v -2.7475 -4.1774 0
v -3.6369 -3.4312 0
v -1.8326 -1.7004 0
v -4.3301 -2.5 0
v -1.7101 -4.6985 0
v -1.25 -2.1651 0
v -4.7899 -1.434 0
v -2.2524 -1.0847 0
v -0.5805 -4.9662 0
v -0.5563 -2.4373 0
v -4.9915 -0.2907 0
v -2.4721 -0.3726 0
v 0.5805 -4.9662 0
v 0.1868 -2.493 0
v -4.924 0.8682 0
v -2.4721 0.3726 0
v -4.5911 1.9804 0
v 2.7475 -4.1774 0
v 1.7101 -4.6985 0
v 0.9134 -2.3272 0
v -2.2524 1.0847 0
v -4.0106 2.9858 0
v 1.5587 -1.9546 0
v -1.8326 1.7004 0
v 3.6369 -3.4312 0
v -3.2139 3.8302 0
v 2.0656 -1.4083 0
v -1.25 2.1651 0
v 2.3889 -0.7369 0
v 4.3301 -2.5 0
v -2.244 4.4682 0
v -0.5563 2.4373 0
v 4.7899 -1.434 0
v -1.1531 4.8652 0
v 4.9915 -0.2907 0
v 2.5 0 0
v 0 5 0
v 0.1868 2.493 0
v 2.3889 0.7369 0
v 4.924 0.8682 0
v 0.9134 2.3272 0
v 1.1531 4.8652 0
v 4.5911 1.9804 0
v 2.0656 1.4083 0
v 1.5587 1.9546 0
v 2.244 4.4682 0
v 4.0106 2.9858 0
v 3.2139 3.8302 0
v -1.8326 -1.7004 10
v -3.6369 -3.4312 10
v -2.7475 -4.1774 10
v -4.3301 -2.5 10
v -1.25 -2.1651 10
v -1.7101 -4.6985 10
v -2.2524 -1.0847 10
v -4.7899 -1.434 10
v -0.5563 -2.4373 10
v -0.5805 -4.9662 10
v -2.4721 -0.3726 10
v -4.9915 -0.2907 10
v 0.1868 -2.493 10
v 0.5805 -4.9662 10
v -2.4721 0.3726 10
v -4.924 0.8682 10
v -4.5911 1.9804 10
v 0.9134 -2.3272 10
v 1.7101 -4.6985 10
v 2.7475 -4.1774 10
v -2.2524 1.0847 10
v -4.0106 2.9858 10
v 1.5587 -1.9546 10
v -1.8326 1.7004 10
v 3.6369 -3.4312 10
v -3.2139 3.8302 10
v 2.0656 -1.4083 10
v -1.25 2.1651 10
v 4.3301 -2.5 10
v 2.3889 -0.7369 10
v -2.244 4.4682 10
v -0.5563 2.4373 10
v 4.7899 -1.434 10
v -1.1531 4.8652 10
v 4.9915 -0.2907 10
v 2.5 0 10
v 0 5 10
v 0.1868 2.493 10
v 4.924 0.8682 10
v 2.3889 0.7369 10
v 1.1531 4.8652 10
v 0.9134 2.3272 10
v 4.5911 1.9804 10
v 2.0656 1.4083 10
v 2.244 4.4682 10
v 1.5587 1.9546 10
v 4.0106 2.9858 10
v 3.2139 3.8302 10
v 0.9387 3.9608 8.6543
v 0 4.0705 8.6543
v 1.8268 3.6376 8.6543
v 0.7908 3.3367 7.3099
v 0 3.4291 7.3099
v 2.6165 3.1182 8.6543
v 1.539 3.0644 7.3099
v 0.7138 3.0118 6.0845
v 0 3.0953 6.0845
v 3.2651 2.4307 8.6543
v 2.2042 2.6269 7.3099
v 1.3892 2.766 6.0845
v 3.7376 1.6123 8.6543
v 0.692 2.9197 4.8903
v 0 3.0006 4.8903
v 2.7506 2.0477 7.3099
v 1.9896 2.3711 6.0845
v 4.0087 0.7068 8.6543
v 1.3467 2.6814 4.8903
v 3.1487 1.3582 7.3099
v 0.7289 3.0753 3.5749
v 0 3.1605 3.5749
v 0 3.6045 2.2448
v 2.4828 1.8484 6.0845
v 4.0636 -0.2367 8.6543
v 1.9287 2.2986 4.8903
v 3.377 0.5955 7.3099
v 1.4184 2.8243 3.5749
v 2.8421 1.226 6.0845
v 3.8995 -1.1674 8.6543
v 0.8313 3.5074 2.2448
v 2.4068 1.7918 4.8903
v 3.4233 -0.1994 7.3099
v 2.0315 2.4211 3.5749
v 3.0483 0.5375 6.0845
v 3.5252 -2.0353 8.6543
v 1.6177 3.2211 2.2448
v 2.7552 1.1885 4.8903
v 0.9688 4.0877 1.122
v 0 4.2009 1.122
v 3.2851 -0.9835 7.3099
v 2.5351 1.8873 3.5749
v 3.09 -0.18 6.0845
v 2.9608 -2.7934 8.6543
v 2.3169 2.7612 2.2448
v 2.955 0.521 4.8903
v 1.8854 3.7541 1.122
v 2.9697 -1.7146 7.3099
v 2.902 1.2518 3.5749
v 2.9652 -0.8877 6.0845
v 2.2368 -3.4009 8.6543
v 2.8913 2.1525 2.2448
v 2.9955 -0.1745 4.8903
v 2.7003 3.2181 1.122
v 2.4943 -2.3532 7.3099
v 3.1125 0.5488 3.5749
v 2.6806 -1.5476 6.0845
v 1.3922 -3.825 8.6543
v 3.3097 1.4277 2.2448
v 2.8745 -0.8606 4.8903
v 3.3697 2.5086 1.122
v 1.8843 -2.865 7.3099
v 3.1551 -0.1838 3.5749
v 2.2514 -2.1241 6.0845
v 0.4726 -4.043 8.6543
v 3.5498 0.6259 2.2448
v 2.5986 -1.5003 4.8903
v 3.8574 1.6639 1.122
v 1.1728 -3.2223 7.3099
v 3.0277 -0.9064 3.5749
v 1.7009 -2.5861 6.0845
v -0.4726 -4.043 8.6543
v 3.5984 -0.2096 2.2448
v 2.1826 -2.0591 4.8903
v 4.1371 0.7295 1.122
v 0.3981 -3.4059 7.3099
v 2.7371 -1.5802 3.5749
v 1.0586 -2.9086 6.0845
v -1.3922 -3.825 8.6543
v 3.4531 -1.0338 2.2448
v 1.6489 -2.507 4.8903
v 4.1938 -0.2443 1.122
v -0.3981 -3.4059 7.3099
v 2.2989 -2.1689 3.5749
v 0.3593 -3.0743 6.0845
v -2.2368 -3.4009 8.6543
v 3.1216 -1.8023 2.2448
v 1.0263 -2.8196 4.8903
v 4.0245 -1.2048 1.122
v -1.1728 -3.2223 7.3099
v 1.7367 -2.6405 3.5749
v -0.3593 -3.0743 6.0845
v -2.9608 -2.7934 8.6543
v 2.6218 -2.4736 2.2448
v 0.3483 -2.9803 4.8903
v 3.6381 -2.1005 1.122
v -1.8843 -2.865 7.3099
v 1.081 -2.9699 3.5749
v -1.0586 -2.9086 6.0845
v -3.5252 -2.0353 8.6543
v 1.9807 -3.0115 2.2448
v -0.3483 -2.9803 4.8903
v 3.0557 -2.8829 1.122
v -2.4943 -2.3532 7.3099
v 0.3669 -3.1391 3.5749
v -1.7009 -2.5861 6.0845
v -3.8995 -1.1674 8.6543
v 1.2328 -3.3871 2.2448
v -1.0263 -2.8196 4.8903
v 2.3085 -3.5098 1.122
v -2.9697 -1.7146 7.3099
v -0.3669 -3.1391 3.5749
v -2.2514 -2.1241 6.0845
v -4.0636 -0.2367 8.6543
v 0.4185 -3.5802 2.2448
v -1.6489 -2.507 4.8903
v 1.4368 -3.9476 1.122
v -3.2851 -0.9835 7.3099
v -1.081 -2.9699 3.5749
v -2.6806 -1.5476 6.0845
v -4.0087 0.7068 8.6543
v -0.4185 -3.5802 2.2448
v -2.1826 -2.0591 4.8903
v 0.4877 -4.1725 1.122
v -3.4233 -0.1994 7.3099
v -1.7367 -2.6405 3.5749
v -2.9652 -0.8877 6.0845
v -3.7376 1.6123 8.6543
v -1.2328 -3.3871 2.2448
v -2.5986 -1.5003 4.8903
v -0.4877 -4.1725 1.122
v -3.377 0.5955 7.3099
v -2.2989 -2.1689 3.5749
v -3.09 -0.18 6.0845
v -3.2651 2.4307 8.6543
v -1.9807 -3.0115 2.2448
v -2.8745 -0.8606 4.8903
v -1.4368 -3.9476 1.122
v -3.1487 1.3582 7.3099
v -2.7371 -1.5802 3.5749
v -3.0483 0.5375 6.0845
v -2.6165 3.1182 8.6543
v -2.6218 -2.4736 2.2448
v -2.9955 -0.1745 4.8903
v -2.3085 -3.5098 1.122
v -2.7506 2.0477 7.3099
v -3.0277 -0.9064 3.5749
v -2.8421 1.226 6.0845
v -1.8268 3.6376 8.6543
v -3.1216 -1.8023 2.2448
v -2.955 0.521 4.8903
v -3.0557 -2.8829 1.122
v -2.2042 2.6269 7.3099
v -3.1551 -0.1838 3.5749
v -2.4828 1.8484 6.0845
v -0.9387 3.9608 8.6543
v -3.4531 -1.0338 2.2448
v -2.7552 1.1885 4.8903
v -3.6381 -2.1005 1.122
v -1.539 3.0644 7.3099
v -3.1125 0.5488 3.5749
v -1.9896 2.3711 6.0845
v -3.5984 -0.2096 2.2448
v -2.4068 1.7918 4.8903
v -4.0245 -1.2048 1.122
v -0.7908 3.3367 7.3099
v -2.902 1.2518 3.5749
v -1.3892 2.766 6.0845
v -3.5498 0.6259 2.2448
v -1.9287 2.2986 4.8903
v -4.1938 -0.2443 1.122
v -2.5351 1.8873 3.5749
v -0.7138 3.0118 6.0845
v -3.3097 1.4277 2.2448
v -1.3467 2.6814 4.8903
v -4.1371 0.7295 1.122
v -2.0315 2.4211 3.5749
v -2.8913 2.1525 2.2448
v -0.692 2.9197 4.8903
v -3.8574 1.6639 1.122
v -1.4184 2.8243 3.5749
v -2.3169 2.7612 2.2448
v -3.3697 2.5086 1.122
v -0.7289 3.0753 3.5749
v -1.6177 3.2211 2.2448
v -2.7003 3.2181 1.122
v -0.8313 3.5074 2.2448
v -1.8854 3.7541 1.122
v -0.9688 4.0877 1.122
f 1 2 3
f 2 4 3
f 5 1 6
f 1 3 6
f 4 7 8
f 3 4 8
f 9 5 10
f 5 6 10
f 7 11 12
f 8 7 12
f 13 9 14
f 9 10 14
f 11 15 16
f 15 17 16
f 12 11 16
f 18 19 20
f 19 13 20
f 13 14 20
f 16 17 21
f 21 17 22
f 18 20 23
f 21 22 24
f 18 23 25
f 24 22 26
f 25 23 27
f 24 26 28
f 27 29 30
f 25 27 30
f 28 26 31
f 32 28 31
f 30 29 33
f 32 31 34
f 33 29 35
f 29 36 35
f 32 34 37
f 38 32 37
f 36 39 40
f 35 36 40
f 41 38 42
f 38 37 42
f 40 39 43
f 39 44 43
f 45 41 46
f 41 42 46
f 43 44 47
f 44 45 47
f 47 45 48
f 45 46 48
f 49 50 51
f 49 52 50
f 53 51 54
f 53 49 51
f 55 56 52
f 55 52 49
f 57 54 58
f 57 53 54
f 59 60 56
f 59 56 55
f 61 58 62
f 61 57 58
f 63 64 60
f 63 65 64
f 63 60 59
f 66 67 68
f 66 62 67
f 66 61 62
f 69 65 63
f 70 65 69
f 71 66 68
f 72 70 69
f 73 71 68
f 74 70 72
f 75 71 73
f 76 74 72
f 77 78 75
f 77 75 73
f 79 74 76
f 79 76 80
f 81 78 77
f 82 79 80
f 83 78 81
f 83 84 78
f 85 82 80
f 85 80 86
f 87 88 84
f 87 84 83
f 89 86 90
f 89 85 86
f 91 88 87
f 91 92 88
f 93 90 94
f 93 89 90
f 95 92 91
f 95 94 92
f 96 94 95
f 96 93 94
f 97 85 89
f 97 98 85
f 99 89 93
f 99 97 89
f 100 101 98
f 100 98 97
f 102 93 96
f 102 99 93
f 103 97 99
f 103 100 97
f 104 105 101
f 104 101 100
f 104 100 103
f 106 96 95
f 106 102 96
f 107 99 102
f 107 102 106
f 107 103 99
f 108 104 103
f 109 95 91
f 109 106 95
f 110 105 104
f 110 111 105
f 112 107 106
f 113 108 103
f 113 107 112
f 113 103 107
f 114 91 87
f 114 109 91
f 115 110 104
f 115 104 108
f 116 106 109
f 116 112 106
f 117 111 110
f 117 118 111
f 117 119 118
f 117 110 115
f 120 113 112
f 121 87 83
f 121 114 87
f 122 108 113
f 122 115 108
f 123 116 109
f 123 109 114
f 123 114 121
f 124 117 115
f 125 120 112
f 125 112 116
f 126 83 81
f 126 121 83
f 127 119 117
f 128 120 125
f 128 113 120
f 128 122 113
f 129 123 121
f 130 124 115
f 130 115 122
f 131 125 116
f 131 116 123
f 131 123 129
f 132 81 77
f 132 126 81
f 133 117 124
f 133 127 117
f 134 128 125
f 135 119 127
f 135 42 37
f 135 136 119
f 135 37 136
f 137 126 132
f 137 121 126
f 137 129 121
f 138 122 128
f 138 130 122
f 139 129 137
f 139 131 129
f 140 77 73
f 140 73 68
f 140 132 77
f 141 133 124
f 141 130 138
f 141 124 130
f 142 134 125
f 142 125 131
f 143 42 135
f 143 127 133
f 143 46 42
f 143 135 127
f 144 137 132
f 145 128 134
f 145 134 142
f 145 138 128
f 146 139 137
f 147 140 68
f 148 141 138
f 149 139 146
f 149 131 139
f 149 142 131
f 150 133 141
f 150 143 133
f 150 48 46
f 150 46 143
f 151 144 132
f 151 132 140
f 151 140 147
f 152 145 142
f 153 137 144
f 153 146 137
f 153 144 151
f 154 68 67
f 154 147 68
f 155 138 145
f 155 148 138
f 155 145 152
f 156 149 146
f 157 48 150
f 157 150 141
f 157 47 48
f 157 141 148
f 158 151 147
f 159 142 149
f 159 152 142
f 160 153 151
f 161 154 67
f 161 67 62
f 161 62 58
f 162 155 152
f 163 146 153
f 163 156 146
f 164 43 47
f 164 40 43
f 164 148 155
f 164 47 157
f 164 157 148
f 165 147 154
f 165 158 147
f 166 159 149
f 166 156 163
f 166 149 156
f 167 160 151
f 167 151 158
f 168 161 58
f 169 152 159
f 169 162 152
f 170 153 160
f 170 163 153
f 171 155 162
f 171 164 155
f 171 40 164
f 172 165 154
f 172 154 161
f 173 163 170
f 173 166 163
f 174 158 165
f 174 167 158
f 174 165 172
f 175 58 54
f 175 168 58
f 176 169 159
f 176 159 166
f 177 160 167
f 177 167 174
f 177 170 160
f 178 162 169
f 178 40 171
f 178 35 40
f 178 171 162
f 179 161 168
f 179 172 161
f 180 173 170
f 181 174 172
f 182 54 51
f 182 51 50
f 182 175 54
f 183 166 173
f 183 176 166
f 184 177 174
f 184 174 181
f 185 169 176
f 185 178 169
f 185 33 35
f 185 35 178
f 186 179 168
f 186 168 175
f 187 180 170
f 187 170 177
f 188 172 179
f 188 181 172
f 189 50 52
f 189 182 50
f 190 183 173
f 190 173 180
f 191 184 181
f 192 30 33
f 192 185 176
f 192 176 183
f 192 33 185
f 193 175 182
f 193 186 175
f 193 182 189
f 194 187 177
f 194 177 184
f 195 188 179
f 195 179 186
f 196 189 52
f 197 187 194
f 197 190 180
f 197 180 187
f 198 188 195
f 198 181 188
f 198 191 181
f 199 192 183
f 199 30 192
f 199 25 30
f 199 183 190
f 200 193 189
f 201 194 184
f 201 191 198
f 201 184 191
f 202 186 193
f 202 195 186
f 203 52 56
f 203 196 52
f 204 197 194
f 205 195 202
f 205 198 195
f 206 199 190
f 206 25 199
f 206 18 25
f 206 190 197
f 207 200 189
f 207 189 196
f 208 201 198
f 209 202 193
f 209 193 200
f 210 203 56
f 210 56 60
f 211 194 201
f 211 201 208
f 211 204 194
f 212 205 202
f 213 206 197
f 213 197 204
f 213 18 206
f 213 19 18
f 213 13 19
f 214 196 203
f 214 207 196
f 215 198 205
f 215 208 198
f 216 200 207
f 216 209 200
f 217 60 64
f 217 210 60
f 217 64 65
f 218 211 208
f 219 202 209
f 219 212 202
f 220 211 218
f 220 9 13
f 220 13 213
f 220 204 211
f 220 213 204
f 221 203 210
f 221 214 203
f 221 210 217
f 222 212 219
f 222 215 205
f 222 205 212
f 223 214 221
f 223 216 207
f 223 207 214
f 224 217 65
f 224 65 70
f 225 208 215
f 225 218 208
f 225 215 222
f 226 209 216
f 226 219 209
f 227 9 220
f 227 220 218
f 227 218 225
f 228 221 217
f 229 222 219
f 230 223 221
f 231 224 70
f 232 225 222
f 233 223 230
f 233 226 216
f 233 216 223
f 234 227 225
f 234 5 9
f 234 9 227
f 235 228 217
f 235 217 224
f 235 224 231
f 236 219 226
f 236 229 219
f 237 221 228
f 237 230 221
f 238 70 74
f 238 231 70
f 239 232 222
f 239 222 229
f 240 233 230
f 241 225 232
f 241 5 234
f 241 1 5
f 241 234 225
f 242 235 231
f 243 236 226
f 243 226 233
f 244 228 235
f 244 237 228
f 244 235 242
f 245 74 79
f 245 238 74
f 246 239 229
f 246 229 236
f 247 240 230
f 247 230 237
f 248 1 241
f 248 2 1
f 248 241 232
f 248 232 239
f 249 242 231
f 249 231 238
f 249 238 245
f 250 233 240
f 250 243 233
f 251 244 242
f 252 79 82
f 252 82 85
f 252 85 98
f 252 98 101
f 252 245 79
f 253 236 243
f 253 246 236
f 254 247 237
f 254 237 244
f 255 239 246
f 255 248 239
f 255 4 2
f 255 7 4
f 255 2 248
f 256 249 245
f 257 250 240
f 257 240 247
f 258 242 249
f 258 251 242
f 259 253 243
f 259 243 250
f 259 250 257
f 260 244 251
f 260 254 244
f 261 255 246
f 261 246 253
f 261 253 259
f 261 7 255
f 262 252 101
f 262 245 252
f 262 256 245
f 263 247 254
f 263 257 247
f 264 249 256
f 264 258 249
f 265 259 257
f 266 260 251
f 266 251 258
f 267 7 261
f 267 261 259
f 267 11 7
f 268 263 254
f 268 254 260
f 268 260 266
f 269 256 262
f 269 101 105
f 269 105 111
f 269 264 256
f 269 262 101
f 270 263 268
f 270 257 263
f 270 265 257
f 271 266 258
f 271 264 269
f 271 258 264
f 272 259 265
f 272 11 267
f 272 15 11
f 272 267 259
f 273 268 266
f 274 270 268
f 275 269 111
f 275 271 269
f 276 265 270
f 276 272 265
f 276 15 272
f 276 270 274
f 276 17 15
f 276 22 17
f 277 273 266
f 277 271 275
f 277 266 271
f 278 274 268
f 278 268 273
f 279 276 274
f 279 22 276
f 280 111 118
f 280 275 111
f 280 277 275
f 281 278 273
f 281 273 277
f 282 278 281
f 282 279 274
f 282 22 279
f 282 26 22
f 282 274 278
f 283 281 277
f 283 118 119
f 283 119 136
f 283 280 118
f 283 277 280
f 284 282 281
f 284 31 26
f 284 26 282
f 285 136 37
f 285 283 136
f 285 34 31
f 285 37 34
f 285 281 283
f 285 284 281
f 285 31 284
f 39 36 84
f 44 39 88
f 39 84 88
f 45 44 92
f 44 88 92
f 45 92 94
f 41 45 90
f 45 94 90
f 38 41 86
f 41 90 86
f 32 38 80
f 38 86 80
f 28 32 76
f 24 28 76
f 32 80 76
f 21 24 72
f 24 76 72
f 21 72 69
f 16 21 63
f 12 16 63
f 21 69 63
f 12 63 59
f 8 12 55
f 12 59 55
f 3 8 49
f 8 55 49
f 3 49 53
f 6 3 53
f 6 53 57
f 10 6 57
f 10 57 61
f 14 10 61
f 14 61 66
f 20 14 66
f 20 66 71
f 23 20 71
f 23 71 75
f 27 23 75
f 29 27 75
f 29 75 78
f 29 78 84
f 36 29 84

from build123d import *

# Parameters (mm, degrees)
SKETCH1_R           = 5
BOSS_EXTRUDE1_DEPTH = 10
SKETCH3_R           = 2.5
CUT_EXTRUDE1_DEPTH  = 11.0000001


with BuildPart() as part:
    # Sketch1 → Boss-Extrude1 (new body)
    with BuildSketch(Plane.XY):
        Circle(SKETCH1_R)
    extrude(amount=BOSS_EXTRUDE1_DEPTH)

    # Sketch2 → Cut-Revolve1 (revolve, cut)
    with BuildSketch(Plane(origin=(0, 0, 0), x_dir=(0, 0, -1), z_dir=(1, 0, 0))):
        with BuildLine():
            Line((-10, 5), (0, 5))
            add(Edge.make_bspline(
                [(-10, 5), (-4.983047183, 0.999551108), (0, 5)],
                knots=[0, 0, 0, 1, 1, 1], degree=2))
        make_face()
    revolve(axis=Axis((0, 0, 13.970265117), (0, 0, -1)), mode=Mode.SUBTRACT)

    # Sketch3 → Cut-Extrude1 (cut, through all)
    with BuildSketch(Plane.XY.offset(10)):
        Circle(SKETCH3_R)
    extrude(amount=-CUT_EXTRUDE1_DEPTH, mode=Mode.SUBTRACT)


solid = part.part
